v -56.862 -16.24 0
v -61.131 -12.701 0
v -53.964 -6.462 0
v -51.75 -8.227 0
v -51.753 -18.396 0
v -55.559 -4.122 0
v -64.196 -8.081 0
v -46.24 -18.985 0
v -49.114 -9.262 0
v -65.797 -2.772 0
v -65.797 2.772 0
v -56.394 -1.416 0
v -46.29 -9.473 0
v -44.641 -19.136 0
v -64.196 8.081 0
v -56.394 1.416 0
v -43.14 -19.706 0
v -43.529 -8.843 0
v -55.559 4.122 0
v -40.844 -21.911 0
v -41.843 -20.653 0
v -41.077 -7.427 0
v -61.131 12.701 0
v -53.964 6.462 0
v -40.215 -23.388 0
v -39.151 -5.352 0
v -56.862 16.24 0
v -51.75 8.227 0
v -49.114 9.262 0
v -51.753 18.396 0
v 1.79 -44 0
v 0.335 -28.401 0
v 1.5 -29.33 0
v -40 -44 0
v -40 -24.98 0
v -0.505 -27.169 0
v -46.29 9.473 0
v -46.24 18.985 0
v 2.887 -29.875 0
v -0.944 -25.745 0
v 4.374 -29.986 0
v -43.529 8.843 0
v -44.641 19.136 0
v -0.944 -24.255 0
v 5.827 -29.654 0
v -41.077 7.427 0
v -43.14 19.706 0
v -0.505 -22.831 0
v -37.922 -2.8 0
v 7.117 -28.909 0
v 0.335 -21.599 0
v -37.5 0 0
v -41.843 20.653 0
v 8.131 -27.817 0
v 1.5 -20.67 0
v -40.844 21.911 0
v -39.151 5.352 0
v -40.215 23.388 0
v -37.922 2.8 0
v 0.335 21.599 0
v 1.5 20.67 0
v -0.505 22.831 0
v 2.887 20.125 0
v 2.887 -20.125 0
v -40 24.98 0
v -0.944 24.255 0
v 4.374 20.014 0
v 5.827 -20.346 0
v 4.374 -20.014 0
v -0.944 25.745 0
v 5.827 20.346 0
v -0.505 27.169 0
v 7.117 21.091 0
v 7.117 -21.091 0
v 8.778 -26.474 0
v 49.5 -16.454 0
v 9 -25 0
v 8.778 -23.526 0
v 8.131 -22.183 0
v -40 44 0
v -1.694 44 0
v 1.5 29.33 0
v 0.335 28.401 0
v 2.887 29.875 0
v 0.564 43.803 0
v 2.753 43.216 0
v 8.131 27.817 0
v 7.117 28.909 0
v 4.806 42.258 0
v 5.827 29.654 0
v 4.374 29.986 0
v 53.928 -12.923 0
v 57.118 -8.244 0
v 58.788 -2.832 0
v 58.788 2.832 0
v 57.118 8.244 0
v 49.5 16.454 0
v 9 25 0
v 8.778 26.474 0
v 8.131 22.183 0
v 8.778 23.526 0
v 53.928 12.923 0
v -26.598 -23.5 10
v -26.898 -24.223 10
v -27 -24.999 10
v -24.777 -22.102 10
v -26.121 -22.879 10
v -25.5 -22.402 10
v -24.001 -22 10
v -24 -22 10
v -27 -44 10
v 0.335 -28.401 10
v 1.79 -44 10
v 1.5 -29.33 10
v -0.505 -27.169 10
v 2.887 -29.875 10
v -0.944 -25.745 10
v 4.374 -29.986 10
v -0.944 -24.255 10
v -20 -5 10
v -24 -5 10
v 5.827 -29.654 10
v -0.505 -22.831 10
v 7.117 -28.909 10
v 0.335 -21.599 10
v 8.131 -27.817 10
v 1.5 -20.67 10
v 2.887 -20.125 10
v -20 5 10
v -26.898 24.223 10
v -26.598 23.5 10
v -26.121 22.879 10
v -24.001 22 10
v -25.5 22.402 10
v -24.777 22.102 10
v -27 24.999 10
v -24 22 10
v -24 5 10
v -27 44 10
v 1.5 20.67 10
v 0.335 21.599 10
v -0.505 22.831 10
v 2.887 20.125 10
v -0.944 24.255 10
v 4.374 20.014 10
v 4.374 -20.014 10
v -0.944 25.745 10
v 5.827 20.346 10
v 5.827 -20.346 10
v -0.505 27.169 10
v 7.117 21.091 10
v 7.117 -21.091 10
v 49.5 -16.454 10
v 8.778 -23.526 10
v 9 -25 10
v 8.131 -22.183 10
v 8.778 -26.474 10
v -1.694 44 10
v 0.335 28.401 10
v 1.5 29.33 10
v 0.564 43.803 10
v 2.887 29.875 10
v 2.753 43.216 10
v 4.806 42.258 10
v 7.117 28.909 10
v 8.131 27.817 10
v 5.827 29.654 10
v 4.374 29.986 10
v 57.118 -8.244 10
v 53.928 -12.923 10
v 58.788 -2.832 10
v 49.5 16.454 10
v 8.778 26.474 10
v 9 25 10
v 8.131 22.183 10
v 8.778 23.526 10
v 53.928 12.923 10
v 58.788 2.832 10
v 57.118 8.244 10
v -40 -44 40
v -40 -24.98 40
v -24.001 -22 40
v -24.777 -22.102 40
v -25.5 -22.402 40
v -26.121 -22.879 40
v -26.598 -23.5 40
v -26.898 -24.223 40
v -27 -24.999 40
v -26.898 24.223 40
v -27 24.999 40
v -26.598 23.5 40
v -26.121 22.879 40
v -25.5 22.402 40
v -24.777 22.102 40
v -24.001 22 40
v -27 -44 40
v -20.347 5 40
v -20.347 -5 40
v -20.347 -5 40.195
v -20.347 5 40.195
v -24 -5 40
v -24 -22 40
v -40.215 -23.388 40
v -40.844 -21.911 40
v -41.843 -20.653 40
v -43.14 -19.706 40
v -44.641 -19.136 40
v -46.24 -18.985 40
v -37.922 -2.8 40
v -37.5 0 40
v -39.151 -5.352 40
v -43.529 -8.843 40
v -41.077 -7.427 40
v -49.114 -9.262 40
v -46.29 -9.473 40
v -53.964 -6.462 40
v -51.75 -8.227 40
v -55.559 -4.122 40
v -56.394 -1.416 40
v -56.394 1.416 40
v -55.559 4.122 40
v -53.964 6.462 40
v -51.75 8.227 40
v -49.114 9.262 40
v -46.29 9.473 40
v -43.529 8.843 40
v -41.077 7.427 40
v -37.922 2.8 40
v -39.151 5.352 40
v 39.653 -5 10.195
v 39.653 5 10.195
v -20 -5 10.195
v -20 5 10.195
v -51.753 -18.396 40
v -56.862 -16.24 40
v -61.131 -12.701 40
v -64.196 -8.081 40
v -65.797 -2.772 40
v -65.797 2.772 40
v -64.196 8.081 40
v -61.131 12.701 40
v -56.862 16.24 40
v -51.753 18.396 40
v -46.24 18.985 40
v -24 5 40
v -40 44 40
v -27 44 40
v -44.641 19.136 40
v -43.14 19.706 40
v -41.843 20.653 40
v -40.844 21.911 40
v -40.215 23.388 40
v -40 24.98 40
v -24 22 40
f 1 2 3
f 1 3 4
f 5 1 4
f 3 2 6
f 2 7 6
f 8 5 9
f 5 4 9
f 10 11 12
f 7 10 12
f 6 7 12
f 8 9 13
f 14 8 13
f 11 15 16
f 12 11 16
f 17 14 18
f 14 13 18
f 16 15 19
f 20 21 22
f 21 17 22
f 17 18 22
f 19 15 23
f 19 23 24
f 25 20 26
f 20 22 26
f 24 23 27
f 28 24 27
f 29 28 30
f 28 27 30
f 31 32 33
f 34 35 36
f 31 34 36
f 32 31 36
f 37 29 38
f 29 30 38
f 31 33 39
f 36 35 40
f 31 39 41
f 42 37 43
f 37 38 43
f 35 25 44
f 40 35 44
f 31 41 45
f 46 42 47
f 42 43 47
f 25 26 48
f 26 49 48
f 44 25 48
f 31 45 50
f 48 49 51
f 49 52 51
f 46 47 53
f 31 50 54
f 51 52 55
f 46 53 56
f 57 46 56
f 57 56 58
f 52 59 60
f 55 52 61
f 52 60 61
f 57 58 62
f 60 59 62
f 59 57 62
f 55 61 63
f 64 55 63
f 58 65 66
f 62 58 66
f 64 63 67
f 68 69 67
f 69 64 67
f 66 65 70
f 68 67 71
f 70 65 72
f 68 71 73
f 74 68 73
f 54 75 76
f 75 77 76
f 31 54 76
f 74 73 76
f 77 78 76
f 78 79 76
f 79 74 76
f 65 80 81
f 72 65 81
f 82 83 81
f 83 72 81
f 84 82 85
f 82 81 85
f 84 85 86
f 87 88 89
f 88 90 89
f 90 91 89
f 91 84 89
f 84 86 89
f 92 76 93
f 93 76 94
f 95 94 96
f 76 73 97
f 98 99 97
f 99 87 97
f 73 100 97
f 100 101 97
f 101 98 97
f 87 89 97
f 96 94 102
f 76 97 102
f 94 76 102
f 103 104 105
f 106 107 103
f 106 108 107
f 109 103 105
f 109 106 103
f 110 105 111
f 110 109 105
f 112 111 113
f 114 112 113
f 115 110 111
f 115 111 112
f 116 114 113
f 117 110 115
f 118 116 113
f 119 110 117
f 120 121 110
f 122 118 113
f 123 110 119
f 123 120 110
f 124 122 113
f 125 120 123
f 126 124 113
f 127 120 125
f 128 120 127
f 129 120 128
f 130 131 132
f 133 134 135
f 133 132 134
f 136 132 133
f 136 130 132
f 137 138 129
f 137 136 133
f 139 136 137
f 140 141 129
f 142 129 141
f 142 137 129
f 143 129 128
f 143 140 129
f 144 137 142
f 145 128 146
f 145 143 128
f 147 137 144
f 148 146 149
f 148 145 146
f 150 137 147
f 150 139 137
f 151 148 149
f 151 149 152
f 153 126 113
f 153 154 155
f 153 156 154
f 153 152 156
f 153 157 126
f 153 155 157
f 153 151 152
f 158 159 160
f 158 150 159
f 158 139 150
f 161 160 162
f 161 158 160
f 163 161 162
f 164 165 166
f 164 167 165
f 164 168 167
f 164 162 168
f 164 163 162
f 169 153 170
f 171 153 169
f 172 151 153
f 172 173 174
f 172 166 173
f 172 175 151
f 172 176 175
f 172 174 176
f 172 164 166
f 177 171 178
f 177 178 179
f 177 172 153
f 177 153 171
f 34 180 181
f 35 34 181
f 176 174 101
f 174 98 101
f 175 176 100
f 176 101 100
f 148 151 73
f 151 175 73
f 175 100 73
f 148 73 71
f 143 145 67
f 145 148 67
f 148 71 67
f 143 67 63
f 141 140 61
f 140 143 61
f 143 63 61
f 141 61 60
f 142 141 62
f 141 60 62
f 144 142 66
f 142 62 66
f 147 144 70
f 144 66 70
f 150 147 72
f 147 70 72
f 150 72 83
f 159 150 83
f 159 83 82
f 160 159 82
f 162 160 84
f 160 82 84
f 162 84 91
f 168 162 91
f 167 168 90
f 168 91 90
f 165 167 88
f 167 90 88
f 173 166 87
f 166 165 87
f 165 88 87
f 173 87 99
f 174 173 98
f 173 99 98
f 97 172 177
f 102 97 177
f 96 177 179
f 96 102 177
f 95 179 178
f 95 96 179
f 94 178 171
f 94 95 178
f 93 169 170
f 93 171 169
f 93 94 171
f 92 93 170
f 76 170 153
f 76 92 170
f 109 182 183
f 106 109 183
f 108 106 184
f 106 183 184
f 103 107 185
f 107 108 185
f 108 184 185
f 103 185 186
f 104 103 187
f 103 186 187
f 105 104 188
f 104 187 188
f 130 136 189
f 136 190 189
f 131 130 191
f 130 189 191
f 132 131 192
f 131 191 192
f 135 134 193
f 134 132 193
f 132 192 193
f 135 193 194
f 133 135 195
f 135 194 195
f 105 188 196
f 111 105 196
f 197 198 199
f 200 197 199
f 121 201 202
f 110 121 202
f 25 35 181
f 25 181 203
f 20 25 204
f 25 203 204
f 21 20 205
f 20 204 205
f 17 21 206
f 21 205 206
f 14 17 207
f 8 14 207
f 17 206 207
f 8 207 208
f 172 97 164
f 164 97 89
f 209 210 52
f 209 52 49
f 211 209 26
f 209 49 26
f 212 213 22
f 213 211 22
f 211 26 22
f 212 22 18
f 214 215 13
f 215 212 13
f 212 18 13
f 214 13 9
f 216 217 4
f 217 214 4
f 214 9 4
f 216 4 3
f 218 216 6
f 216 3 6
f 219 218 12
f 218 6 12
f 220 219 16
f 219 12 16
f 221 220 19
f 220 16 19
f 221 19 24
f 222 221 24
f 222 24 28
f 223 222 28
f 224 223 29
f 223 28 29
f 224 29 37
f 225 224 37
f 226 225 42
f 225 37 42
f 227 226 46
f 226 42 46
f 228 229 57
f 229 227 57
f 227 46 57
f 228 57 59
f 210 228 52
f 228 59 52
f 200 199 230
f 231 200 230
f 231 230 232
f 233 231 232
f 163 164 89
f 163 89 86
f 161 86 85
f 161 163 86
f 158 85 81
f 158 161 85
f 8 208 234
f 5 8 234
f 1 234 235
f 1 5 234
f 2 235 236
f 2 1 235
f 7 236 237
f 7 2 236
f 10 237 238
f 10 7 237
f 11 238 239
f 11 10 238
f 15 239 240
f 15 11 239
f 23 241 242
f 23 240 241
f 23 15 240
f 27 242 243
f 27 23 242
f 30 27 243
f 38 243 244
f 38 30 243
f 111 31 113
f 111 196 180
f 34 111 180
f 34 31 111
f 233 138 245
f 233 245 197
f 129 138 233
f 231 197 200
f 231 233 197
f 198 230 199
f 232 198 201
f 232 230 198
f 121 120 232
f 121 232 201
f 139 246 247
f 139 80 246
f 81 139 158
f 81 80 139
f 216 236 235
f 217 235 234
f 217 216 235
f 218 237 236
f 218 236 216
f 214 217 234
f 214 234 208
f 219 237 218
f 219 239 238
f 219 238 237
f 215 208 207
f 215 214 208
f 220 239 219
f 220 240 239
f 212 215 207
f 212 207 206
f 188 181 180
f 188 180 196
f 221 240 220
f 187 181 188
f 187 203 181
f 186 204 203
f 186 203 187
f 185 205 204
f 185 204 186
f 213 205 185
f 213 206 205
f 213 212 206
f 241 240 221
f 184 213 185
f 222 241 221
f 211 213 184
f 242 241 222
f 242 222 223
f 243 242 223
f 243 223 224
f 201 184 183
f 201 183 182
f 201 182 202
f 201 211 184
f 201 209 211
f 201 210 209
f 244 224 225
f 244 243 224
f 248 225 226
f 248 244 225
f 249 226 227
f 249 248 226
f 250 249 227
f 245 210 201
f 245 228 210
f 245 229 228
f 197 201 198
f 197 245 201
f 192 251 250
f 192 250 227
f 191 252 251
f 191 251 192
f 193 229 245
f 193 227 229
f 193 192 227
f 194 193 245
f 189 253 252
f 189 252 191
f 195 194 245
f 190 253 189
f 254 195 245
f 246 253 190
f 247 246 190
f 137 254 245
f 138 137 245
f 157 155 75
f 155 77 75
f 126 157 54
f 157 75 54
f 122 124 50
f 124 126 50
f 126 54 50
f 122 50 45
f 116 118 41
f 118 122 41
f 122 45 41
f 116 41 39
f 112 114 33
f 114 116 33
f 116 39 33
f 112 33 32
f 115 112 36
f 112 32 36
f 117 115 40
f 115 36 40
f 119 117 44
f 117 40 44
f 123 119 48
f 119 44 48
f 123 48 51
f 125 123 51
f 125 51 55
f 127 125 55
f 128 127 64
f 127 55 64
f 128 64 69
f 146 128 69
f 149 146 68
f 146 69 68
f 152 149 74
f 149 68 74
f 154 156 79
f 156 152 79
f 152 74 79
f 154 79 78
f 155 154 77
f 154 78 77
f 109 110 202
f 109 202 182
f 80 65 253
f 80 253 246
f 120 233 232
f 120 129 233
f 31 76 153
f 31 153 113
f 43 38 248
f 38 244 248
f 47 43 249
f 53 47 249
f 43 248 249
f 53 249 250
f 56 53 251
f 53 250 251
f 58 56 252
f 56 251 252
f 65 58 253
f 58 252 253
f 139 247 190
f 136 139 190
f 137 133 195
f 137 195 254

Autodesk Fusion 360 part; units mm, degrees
sketch "Sketch1" plane through (0, 0, 0) normal (0, 0, 1) x (1, 0, 0)
  line L0 (1.7898, -44) -> (-40, -44)
  line L1 (-40, 44) -> (1.7898, 44)
  line L2 (-40, 44) -> (-27, 44)
  line L3 (-27, -44) -> (-40, -44)
  line L4 (-27, 22) -> (-24, 22)
  line L5 (-24, -22) -> (-27, -22)
  line L6 (-24, 5) -> (40, 5)
  line L7 (40, 5) -> (40, -5)
  line L8 (40, -5) -> (-24, -5)
  line L9 (-24, 5) -> (-20, 5)
  line L10 (-20, 5) -> (-20, -5)
  line L11 (-20, -5) -> (-24, -5)
  circle A0 centre (-47, 0) radius 9.5
  circle A1 centre (4, 25) radius 5
  circle A2 centre (4, -25) radius 5
  line L12 (49.5, 16.4545) -> (1.7898, 44)
  line L13 (49.5, -16.4545) -> (1.7898, -44)
  arc A3 (-40, 17.6635) -> (-40, -17.6635) centre (-47, 0) ccw
  line L14 (4.5455, -5) -> (4, -4.4) construction
  line L15 (4, -42.7239) -> (4, -44) construction
  line L16 (4, 5) -> (4, 4.4) construction
  line L17 (4, -4.4) -> (4, -5) construction
  line L18 (4, 4.4) -> (4.5455, 5) construction
  line L19 (-56.5, 0) -> (-59, 0) construction
  line L20 (-20, 0) -> (-27, 0) construction
  line L21 (-37.5, 0) -> (-40, 0) construction
  line L22 (-40, 0) -> (-37.5, 0) construction
  line L23 (-27, 0) -> (-24, 0) construction
  line L24 (40, 5) -> (40, -5)
  arc A4 (49.5, -16.4545) -> (49.5, 16.4545) centre (40, 0) ccw
  line L25 (-24, 22) -> (-24, 5)
  line L26 (-24, -5) -> (-24, -22)
  line L27 (-40, -44) -> (-40, -17.6635)
  line L28 (-40, 17.6635) -> (-40, 44)
  line L29 (-40, -44) -> (-40, -17.6635)
  line L30 (-40, 17.6635) -> (-40, 44)
  line L31 (-27, 44) -> (-27, 22)
  line L32 (-27, -22) -> (-27, -44)
  dimension "d2" = 88
  dimension "d3" = 13
  dimension "d4" = 3
  dimension "d5" = 44
  dimension "d6" = 22
  dimension "d7" = 64
  dimension "d8" = 10
  dimension "d9" = 17
  dimension "d10" = 4
  dimension "d12" = 19
  dimension "d13" = 38
  dimension "d17" = 10
  dimension "d18" = 10
extrude "Extrude1" add sketch "Sketch1" along normal blind 10 contours L0 L1 L4 L5 L6 L7 L8 L9 L11 L12 L13 L24 A4 L25 L26 L31 L32
extrude "Extrude2" add sketch "Sketch1" along normal blind 10 contours L6 L7 L8 L10 L24
extrude "Extrude3" add sketch "Sketch1" along normal blind 40 contours L0 L1 L2 L3 L4 L5 L6 L8 L9 L10 L11 A3 L25 L26 L27 L28 L29 L30 L31 L32
fillet "Fillet1" radius 6 1 edges at (-40, -17.6635, 20)
fillet "Fillet2" radius 6 1 edges at (-40, 17.6635, 20)
fillet "Fillet3" radius 3 1 edges at (-27, -22, 25)
fillet "Fillet4" radius 3 1 edges at (-27, 22, 25)
fillet "Fillet5" radius 13 1 edges at (1.7898, 44, 5)
sketch "Sketch2" plane through (0, 0, 0) normal (0, 1, 0) x (1, 0, 0)
  line L0 (39.6527, -10.1952) -> (-20.3473, -10.1952)
  line L1 (-20.3473, -10.1952) -> (-20.3473, -40.1952)
  line L2 (-20.3473, -40.1952) -> (39.6527, -10.1952)
  dimension "d36" = 60
  dimension "d37" = 30
extrude "Extrude4" add sketch "Sketch2" along normal mid plane 10
equation "d5 = 3 mm + 38 mm + 3 mm"
equation "d7 = 67 mm - 3 mm"
equation "d9 = 14 mm + 3 mm"
equation "d36 = 67 mm - 3 mm - 4 mm"
equation "d37 = 40 mm - 10 mm"
